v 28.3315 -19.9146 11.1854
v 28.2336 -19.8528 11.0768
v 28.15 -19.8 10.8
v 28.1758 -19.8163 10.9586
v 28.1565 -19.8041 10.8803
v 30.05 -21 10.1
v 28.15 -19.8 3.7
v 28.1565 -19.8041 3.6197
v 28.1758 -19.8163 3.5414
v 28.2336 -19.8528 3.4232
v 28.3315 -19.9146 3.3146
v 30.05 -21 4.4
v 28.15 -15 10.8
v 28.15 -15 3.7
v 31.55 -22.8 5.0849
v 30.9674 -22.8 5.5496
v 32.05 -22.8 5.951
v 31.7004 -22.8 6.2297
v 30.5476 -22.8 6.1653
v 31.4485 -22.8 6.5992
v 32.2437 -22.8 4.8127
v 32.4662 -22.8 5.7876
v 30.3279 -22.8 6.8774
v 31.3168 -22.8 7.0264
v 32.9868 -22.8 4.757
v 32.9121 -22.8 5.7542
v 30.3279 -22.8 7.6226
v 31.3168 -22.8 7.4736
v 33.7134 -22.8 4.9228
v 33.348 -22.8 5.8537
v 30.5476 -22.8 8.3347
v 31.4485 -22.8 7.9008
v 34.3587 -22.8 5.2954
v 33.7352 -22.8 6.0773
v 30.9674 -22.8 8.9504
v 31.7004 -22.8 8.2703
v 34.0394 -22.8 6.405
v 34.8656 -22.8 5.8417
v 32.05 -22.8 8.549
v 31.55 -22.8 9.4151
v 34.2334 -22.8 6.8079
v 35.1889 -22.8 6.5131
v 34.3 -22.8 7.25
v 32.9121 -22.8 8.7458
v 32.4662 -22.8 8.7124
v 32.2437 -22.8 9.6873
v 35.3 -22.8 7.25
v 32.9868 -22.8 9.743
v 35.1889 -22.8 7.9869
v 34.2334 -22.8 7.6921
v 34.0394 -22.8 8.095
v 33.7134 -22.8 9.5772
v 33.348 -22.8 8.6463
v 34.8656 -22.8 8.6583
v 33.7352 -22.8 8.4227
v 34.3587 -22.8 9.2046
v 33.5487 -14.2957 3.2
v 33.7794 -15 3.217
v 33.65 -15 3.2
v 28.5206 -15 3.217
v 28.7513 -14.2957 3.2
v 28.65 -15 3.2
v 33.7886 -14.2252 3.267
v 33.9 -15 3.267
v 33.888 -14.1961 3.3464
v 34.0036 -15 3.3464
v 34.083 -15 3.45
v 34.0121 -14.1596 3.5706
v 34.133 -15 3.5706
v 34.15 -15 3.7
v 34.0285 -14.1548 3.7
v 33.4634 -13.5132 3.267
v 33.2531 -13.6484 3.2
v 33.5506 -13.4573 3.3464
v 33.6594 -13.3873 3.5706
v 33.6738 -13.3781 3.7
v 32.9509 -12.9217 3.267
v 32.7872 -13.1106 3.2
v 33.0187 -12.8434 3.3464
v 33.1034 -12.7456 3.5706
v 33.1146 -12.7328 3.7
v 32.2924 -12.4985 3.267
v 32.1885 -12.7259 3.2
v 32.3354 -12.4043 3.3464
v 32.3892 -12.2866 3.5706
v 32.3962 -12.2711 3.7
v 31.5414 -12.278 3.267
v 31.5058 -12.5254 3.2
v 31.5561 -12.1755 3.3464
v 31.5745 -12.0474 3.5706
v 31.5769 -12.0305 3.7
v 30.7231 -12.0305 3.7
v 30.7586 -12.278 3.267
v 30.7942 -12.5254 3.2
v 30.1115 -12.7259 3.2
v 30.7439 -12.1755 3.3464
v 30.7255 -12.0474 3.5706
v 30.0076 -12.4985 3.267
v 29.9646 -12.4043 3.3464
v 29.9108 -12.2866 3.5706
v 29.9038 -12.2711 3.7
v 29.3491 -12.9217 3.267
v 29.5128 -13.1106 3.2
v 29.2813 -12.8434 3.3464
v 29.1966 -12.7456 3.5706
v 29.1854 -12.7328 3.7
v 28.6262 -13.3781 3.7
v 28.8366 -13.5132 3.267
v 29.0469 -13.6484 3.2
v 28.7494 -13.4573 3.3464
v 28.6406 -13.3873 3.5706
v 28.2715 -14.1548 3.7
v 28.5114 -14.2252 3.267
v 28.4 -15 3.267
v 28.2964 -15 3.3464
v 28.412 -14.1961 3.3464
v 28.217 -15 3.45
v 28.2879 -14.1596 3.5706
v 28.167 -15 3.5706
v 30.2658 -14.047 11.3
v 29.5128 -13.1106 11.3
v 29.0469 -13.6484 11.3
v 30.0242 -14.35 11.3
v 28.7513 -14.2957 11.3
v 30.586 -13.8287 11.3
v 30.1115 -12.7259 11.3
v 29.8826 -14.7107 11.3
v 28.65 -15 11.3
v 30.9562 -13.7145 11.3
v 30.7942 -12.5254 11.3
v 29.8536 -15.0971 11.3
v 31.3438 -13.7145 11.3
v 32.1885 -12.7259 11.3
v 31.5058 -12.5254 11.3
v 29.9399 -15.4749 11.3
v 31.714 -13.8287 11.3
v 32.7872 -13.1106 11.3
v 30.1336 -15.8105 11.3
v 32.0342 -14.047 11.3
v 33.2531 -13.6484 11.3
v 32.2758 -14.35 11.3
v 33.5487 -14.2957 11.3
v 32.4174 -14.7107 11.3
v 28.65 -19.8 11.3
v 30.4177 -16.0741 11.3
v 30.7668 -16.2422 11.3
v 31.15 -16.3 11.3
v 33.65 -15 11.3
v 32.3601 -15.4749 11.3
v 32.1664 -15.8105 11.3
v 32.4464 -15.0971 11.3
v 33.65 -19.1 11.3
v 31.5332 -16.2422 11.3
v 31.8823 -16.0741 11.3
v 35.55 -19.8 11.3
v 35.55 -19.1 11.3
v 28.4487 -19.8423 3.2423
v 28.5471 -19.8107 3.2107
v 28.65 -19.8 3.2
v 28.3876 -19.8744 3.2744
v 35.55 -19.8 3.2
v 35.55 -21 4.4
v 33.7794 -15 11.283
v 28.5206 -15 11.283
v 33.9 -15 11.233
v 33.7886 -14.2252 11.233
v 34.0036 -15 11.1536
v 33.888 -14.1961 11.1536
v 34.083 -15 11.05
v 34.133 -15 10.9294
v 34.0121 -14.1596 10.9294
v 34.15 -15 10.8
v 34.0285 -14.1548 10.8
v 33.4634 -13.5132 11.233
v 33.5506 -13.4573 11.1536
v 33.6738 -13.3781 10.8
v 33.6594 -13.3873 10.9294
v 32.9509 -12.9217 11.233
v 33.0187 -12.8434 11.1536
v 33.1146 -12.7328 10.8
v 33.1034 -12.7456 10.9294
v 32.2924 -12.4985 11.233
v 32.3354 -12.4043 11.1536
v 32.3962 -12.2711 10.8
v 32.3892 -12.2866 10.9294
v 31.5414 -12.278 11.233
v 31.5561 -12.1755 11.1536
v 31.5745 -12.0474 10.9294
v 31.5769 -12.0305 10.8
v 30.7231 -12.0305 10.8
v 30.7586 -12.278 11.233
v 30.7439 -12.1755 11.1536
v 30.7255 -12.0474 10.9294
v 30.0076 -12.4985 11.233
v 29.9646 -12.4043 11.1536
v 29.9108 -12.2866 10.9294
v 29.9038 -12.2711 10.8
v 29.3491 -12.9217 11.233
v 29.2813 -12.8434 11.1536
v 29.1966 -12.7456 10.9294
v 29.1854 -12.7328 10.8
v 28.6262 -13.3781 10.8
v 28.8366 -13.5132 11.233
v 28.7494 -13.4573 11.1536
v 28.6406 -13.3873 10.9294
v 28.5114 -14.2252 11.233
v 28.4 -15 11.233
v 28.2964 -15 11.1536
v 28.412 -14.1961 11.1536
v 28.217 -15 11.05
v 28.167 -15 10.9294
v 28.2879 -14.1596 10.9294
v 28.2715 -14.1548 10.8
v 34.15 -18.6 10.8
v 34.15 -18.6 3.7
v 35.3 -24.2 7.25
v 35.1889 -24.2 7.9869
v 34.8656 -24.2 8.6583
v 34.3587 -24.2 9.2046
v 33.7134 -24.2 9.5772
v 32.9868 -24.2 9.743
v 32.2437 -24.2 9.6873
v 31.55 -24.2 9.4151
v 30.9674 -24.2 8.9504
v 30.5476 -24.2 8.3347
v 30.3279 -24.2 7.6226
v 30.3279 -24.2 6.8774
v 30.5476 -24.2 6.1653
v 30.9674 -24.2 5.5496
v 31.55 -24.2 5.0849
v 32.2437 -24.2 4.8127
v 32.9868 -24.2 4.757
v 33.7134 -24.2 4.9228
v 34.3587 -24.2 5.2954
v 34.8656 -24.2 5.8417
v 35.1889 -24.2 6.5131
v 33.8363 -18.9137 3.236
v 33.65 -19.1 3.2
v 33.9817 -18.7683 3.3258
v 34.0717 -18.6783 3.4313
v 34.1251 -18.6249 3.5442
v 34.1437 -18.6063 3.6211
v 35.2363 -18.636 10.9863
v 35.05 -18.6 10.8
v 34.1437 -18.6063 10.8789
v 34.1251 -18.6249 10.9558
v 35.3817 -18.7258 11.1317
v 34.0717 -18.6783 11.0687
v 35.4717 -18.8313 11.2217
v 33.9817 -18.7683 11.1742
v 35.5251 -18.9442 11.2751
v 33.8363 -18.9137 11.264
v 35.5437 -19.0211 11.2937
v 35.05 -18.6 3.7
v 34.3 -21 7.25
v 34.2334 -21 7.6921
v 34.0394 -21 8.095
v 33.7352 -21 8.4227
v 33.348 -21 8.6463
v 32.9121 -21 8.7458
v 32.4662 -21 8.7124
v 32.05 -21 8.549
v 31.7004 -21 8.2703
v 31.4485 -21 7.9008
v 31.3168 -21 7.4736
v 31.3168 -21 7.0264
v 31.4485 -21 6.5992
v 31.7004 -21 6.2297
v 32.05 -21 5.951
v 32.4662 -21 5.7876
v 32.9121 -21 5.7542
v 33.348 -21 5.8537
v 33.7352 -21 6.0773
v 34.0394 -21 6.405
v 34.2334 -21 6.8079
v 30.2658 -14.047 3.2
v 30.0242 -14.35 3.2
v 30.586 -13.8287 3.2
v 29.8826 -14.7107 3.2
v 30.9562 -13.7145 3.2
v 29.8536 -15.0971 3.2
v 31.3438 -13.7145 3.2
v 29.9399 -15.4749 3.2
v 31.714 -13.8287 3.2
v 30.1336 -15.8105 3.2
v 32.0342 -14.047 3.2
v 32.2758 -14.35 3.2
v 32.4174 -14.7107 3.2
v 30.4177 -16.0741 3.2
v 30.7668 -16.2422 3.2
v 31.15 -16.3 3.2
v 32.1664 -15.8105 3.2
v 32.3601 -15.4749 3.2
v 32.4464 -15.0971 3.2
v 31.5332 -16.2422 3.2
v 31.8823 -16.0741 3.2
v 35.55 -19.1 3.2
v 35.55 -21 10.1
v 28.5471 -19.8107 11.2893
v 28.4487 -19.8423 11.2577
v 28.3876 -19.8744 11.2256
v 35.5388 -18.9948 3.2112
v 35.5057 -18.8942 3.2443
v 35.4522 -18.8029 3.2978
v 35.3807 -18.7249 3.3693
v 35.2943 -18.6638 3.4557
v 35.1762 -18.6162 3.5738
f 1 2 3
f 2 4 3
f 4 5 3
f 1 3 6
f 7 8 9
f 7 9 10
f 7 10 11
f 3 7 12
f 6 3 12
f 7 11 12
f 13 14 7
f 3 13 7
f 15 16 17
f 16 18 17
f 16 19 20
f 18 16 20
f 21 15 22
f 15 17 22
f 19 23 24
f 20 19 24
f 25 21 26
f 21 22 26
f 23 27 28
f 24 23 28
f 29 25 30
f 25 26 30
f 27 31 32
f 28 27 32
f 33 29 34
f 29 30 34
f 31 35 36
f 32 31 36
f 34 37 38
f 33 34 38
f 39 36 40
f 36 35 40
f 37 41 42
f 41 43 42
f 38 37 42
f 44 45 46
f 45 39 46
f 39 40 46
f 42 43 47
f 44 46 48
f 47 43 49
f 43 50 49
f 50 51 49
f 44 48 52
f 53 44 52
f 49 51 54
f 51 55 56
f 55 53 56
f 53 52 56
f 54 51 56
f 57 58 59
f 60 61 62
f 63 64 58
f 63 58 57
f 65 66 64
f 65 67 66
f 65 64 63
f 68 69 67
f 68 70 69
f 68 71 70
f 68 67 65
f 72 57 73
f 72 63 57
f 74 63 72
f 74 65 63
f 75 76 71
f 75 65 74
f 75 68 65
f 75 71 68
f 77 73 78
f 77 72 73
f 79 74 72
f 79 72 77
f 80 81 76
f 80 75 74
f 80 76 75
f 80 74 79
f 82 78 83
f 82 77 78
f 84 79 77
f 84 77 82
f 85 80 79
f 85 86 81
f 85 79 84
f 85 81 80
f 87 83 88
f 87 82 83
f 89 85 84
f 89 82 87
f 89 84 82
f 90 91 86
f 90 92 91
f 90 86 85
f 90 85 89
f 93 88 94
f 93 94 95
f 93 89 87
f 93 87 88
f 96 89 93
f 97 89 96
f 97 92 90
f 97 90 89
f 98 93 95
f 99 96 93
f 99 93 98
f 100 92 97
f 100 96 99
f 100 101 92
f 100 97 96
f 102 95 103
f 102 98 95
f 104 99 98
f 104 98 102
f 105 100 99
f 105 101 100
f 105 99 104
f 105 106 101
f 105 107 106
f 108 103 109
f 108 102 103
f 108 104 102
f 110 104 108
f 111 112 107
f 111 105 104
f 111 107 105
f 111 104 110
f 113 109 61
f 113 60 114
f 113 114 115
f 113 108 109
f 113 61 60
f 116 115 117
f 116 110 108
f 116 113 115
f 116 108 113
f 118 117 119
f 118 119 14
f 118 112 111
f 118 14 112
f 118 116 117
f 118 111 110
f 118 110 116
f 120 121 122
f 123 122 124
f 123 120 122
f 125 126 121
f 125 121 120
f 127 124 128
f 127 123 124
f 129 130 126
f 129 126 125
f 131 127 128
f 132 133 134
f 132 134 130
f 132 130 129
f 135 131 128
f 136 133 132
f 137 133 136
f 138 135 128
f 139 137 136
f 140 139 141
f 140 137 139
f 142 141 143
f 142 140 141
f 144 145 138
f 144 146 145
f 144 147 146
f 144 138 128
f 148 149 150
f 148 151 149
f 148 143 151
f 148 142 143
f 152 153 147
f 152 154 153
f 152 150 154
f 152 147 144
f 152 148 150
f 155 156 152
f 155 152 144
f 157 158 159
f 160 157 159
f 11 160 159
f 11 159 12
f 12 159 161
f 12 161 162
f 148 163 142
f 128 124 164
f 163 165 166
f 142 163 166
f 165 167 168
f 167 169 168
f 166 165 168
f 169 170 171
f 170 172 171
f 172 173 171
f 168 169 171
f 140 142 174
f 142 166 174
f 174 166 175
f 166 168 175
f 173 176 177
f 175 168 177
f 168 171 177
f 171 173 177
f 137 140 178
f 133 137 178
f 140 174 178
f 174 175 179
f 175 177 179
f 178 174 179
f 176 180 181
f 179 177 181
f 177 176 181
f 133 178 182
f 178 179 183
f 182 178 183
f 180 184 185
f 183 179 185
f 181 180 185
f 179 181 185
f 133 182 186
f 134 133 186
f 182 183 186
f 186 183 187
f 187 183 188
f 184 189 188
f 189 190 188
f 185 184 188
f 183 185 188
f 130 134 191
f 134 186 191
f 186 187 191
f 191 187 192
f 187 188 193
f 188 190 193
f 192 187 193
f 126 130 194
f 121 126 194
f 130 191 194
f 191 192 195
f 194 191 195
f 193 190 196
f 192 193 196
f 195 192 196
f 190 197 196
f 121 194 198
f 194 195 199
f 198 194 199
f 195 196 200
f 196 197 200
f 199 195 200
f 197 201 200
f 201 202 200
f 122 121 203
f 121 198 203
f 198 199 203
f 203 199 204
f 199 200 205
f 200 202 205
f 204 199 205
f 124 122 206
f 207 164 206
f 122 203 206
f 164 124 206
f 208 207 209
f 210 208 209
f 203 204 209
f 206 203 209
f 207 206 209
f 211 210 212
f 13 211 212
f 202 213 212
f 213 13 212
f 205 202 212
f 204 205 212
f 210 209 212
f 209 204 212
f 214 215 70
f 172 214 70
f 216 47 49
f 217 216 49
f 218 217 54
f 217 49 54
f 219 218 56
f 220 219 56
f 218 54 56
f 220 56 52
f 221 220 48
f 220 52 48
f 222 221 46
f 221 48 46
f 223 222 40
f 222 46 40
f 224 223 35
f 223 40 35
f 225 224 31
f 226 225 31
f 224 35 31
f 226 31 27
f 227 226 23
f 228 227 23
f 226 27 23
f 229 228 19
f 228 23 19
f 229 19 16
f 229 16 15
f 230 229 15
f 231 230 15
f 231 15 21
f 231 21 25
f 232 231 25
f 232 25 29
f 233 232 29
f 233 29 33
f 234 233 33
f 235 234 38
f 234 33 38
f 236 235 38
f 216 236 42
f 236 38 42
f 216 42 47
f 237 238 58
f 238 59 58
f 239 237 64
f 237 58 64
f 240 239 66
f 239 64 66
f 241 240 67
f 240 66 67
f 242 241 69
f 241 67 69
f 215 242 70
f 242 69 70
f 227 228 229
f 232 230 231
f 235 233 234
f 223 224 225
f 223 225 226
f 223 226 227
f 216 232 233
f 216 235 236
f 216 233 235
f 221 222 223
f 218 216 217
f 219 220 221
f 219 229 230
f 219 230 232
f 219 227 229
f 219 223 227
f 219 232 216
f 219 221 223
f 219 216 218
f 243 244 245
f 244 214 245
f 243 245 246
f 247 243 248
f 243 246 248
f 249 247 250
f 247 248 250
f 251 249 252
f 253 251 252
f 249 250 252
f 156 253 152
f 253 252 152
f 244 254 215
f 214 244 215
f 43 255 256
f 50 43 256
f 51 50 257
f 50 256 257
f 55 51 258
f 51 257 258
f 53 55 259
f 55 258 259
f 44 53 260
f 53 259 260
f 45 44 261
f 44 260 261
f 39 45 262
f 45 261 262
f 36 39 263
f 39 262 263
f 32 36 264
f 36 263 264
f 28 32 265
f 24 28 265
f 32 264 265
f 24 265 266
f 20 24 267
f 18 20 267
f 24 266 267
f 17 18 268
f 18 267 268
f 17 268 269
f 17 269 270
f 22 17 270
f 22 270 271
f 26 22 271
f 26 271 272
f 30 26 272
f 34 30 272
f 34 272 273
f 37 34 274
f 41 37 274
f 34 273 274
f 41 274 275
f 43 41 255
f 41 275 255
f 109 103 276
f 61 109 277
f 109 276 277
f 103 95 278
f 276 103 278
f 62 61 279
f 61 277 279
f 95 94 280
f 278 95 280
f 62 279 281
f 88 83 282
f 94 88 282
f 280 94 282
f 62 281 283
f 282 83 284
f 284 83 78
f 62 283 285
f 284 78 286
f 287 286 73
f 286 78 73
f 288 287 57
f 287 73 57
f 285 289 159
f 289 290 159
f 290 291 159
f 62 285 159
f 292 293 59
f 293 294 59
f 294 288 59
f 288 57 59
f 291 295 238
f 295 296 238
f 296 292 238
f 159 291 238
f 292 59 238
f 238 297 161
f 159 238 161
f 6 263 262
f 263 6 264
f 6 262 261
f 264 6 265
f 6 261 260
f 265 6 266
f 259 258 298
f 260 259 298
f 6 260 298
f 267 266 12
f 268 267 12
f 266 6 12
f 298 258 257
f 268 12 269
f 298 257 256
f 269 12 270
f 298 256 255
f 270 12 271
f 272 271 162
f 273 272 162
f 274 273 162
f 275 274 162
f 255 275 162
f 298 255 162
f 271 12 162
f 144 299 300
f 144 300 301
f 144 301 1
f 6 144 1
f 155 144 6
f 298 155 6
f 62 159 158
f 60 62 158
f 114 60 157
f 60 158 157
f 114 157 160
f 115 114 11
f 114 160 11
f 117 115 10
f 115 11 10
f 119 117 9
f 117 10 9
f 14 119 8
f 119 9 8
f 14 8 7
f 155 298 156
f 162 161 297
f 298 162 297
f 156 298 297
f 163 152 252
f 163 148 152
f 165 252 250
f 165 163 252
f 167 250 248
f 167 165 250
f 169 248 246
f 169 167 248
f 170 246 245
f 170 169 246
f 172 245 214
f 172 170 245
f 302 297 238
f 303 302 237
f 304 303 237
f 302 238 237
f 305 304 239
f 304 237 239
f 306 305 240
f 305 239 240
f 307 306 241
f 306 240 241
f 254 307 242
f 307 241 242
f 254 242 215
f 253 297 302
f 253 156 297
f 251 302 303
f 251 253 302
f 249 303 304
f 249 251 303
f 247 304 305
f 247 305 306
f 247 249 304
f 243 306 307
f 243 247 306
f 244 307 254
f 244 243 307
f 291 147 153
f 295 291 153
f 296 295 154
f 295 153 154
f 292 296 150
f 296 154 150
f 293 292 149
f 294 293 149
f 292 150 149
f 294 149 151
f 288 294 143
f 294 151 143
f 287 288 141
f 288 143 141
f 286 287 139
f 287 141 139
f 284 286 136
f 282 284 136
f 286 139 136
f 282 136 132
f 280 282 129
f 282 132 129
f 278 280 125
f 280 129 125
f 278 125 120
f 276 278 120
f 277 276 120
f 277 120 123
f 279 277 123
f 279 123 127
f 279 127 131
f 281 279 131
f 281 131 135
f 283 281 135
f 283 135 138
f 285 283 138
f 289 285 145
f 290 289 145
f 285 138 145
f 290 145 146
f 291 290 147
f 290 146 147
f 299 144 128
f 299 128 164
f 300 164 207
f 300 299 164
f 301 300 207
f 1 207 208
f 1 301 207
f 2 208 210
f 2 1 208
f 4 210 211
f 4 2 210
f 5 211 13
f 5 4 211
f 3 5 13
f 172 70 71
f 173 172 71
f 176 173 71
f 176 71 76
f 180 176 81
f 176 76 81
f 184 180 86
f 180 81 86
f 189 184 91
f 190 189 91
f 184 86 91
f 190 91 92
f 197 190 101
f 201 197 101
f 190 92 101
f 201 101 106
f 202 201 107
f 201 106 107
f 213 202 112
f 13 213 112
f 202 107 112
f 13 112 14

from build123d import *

# Parameters (mm, degrees)
PAD039_DEPTH            = 8.1
SKETCH076_R             = 1.3
POCKET042_DEPTH         = 8.1
POCKET043_DEPTH         = 8
SKETCH078_R             = 1.5
PAD040_DEPTH            = 1.8
SKETCH079_R             = 2.5
PAD041_DEPTH            = 1.4
FILLET024_R             = 0.5
BODY008_PLACEMENT_ANGLE = 270


with BuildPart() as part:
    # Sketch075 → Pad039 (new body)
    with BuildSketch(Plane.XY):
        with BuildLine():
            ThreePointArc((0, 3), (-3, 0), (0, -3))
            Line((0, -3), (4.8, -3))
            Line((4.8, -3), (6, -1.1))
            Line((6, -1.1), (6, 4.4))
            Line((6, 4.4), (3.6, 4.4))
            Line((3.6, 4.4), (3.6, 3))
            Line((3.6, 3), (0, 3))
        make_face()
    extrude(amount=PAD039_DEPTH)

    # Sketch076 (on DatumPlane) → Pocket042 (cut)
    with BuildSketch(Plane.XY.offset(8.1)):
        Circle(SKETCH076_R)
    extrude(amount=-POCKET042_DEPTH, mode=Mode.SUBTRACT)

    # Sketch077 (on DatumPlane) → Pocket043 (cut)
    with BuildSketch(Plane(origin=(0, 4.4, 0), x_dir=(-1, 0, 0), z_dir=(0, 1, 0))):
        Polygon((-4.8, 0), (-6, 1.2), (-6, 0), align=None)
        Polygon((-4.8, 8.1), (-6, 6.9), (-6, 8.1), align=None)
    extrude(amount=-POCKET043_DEPTH, mode=Mode.SUBTRACT)

    # Sketch078 (on DatumPlane) → Pad040 (join)
    with BuildSketch(Plane.YZ.offset(6)):
        with Locations((1.65, 4.05)):
            Circle(SKETCH078_R)
    extrude(amount=PAD040_DEPTH)

    # Sketch079 (on DatumPlane) → Pad041 (join)
    with BuildSketch(Plane.YZ.offset(7.8)):
        with Locations((1.65, 4.05)):
            Circle(SKETCH079_R)
    extrude(amount=PAD041_DEPTH)

    # Fillet024
    fillet024_edges = [part.edges().sort_by_distance(p)[0] for p in [
        (1.8, 3, 8.1),
        (3.6, 3.7, 8.1),
        (3.6, 4.4, 4.05),
        (-3, 0, 8.1),
        (-3, 0, 0),
        (1.8, 3, 0),
        (3.6, 3.7, 0),
        (2.4, -3, 0),
        (2.4, -3, 8.1),
    ]]
    fillet(fillet024_edges, radius=FILLET024_R)


with BuildPart() as part_1:
    # Body008 placement: moved
    add(part.part.moved(Location((31.15, -15, 3.2))).rotate(Axis((31.15, -15, 3.2), (0, 0, 1)), BODY008_PLACEMENT_ANGLE))


solid = part_1.part
